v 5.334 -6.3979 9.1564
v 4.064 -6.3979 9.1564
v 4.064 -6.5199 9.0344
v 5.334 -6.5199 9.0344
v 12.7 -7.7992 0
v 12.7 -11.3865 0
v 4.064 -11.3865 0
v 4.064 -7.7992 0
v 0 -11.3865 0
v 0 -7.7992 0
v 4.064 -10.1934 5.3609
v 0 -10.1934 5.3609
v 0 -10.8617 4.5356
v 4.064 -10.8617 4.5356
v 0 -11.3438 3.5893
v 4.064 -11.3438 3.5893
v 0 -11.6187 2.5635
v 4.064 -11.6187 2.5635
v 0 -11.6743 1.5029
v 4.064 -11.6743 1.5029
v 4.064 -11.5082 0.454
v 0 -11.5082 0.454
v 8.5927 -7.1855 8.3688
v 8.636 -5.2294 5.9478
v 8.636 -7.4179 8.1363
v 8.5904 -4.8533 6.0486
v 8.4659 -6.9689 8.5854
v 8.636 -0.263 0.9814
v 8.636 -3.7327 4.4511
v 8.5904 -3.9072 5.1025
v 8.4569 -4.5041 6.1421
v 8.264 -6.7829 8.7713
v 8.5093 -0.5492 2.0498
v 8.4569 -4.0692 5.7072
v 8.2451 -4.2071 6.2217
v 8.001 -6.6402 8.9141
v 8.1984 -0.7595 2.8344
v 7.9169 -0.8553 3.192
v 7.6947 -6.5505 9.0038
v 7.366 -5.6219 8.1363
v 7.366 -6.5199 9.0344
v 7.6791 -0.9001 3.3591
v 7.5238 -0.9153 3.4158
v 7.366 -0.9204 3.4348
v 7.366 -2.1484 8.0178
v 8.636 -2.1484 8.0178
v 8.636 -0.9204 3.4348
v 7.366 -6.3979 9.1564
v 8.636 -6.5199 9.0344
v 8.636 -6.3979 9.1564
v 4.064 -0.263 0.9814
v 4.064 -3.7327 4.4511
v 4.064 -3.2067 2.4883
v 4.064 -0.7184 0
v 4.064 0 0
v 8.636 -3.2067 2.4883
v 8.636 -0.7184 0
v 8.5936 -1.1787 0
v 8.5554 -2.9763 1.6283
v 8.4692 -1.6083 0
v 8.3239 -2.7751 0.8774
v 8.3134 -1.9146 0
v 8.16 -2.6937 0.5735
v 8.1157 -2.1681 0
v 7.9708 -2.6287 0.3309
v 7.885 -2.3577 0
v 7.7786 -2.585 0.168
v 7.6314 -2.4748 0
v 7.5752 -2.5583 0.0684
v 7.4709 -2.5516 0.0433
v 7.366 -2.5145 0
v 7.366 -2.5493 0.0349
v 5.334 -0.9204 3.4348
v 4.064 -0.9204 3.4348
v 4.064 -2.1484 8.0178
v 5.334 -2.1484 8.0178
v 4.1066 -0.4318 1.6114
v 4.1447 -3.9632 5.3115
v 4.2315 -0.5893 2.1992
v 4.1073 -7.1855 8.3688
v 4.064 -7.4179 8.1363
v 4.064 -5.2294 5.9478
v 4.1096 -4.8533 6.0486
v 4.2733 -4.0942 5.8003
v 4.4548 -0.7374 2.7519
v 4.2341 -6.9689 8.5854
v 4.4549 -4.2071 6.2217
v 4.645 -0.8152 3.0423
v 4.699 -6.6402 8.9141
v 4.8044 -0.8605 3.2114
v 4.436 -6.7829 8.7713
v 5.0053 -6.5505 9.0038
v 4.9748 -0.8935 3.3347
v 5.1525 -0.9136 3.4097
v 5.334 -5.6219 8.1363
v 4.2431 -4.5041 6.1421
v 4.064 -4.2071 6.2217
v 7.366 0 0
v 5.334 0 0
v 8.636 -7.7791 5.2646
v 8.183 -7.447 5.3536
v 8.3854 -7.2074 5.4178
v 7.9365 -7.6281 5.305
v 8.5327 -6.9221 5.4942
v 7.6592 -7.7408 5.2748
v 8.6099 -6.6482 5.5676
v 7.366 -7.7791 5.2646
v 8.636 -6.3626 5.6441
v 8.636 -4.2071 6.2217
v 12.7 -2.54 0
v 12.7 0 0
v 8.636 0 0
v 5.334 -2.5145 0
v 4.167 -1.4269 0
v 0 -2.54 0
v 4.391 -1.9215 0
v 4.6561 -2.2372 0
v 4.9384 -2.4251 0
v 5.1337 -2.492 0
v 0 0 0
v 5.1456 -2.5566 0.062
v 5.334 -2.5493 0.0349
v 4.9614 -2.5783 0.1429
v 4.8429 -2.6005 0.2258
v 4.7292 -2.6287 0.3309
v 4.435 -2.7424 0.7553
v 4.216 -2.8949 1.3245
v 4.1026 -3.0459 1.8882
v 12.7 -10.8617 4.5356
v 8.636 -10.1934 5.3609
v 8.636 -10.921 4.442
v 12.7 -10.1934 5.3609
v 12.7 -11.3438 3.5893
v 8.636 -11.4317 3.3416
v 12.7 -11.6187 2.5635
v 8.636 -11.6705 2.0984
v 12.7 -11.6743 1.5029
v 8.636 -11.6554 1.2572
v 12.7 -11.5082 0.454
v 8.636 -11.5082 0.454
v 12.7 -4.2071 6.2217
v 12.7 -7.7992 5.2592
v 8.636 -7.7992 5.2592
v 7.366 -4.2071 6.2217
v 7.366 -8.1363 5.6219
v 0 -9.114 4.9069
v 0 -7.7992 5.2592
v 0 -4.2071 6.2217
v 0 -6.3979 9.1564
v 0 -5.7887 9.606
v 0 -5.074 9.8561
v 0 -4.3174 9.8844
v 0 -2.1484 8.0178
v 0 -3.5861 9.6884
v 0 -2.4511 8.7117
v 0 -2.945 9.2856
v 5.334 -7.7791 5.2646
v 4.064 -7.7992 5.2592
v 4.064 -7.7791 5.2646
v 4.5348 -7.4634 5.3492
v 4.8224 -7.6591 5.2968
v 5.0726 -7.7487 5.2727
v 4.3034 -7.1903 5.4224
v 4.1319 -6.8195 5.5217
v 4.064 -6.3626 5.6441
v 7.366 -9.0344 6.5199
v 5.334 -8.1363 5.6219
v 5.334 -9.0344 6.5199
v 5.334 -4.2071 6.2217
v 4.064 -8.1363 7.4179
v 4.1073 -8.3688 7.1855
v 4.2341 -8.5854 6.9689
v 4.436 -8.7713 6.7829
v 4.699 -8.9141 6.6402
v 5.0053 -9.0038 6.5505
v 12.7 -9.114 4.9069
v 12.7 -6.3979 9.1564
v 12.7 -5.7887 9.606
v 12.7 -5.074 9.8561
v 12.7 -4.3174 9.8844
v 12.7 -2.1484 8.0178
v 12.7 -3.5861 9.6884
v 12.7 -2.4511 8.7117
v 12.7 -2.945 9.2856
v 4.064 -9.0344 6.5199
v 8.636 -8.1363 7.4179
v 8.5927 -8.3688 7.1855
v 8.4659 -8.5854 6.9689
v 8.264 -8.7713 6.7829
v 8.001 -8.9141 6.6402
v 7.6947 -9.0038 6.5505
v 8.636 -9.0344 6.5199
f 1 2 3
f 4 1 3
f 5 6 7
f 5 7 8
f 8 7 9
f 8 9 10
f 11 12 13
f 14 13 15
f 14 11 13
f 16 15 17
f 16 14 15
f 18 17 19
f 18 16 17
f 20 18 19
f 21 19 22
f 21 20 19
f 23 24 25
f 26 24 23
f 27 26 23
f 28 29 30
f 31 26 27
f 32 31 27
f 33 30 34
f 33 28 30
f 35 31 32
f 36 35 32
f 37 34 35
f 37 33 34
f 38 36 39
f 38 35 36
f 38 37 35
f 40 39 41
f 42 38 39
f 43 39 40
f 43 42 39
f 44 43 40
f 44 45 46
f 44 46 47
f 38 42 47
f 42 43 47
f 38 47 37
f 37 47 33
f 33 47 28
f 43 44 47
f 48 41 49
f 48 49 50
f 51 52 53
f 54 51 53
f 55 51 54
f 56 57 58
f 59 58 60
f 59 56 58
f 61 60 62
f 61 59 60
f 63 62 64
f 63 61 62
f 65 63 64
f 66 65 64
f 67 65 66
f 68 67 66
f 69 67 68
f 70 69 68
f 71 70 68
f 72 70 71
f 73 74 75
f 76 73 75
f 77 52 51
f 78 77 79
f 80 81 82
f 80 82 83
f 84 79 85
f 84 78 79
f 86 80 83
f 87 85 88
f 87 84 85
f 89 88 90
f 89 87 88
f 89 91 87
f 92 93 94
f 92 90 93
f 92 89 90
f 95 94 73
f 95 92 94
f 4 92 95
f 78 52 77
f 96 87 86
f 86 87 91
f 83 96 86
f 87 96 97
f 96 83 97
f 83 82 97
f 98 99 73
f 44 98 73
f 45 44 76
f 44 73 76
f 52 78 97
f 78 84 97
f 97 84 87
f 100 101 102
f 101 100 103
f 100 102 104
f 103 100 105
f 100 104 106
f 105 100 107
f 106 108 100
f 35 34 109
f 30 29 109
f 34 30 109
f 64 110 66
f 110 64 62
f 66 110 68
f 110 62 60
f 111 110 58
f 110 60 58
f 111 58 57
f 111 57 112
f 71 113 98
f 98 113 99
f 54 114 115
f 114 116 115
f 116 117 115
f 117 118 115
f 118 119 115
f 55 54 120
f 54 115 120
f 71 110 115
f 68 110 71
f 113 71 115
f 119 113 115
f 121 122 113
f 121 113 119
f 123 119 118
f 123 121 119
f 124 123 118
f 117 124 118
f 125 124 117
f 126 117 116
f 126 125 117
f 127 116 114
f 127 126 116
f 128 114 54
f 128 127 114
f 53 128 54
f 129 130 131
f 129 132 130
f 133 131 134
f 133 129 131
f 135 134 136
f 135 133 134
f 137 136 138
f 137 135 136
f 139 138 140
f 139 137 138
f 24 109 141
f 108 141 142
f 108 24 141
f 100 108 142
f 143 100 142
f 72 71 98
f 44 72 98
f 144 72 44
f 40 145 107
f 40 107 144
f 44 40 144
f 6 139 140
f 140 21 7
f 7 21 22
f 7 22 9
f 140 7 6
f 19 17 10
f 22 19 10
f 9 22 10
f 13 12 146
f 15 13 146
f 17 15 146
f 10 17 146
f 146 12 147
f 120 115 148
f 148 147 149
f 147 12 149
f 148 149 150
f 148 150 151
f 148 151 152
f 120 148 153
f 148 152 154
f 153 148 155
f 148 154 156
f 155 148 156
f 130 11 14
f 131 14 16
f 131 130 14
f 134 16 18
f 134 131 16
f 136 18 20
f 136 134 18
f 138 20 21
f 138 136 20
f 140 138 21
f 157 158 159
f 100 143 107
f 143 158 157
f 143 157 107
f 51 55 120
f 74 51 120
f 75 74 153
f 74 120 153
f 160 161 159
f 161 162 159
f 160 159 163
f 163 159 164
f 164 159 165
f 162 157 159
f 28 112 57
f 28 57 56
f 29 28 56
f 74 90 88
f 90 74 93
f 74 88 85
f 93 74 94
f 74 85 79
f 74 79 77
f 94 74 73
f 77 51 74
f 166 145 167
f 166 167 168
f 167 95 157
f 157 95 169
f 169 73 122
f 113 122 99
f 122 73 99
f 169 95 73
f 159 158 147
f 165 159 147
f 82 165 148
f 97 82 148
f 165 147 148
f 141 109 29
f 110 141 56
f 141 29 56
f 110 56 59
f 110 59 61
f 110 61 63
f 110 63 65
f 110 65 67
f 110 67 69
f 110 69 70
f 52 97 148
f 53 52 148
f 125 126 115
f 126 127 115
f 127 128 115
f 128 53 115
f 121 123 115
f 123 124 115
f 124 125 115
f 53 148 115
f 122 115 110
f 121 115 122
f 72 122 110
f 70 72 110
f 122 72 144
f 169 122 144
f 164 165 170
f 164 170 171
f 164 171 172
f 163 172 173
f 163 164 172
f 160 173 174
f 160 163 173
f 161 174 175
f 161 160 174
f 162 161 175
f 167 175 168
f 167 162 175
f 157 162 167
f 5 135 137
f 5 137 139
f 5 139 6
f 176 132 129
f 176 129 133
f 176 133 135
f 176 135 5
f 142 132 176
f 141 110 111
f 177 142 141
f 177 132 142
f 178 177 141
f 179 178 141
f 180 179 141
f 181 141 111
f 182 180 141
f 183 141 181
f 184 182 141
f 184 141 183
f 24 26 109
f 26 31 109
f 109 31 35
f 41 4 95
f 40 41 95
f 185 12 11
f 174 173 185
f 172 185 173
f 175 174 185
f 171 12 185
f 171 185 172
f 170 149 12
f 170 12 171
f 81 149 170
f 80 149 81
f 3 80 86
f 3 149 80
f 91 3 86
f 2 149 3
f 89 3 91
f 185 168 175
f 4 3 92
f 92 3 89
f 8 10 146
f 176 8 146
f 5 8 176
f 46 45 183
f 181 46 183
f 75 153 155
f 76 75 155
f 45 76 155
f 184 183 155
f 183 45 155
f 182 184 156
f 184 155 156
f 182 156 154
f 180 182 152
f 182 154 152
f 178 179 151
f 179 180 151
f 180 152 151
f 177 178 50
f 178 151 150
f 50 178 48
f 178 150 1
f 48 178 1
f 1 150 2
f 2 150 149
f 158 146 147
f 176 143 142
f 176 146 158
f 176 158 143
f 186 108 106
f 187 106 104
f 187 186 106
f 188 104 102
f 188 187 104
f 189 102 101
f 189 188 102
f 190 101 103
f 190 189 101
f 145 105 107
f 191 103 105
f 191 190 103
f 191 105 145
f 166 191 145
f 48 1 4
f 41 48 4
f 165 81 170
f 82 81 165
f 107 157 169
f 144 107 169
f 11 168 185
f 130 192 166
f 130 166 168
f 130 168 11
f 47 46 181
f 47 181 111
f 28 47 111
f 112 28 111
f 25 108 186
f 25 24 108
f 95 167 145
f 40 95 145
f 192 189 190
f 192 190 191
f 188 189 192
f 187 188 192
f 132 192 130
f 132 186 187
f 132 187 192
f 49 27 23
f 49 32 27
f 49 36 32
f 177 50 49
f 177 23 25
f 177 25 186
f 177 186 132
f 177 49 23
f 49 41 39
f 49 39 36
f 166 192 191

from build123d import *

# Parameters (mm, degrees)
BOSS_EXTRUDE1_START   = -3.302
BOSS_EXTRUDE1_DEPTH   = 4.572
BOSS_EXTRUDE1_START_2 = -2.032
BOSS_EXTRUDE1_2_DEPTH = 3.302
BOSS_EXTRUDE1_START_3 = -10.998522628
BOSS_EXTRUDE1_3_DEPTH = 11.998522628
BOSS_EXTRUDE1_4_DEPTH = 3.444411758
SKETCH2_W             = 2.032
SKETCH2_H             = 1.27
CUT_EXTRUDE1_DEPTH    = 3.556
BOSS_EXTRUDE2_DEPTH   = 1.27
BOSS_EXTRUDE3_DEPTH   = 4.064
BOSS_EXTRUDE4_DEPTH   = 1.27
BOSS_EXTRUDE5_START   = 1.27
BOSS_EXTRUDE5_DEPTH   = 1.27
SKETCH7_W             = 8.636
SKETCH7_H             = 3.587305501
BOSS_EXTRUDE6_DEPTH   = 4.16775137
BOSS_EXTRUDE7_START   = 4.064
BOSS_EXTRUDE7_DEPTH   = 4.064
DRAFT1_DEPTH          = 12.7
DRAFT2_START          = -7.533451599
DRAFT2_OUTLINE_W      = 12.7
DRAFT2_OUTLINE_H      = 6.098582272
DRAFT2_DEPTH          = 5.08
FILLET1_R             = 1.27
FILLET2_R             = 5.08


with BuildPart() as part:
    # Boss-Extrude1: read off the stored shape, not the designer's step
    # Boss-Extrude1 outline → Boss-Extrude1 (new body)
    with BuildSketch(Plane(origin=(7.366, 0, 0), x_dir=(0, 0, -1), z_dir=(1, 0, 0)).offset(BOSS_EXTRUDE1_START)):
        with BuildLine():
            Line((-6.519894076, -9.03436579), (-5.264597758, -7.779069472))
            Line((-5.264597758, -7.779069472), (-6.221703947, -4.207100548))
            Line((-6.221703947, -4.207100548), (0, -2.54))
            Line((0, -2.54), (0, 0))
            Line((0, 0), (-8.017755171, -2.148351023))
            ThreePointArc((-8.017755171, -2.148351023), (-9.813806395, -3.944402247), (-9.156406021, -6.397853846))
            Line((-9.156406021, -6.397853846), (-6.519894076, -9.03436579))
        make_face()
    extrude(amount=BOSS_EXTRUDE1_DEPTH)

    # Boss-Extrude1 2 outline → Boss-Extrude1 2 (add)
    with BuildSketch(Plane(origin=(7.366, 0, 0), x_dir=(0, 0, -1), z_dir=(1, 0, 0)).offset(BOSS_EXTRUDE1_START_2)):
        Polygon((-4.16775137, -11.386508497), (-4.16775137, -7.799202996), (-5.259202996, -7.799202996), (-5.264597758, -7.779069472), (-6.519894076, -9.03436579), align=None)
    extrude(amount=BOSS_EXTRUDE1_2_DEPTH)

    # Boss-Extrude1 3 outline → Boss-Extrude1 3 (cut)
    with BuildSketch(Plane(origin=(0, 0, 0), x_dir=(1, 0, 0), z_dir=(0, 0.707106781186548, -0.707106781186547)).offset(BOSS_EXTRUDE1_START_3)):
        with BuildLine():
            Line((7.366, 1.778), (7.366, -6))
            Line((7.366, -6), (8.636000001, -6))
            Line((8.636000001, -6), (8.636000002, -4.490590949))
            Line((8.636000002, -4.490590949), (8.636, 0.508))
            ThreePointArc((8.636, 0.508), (8.264025612, 1.406025612), (7.366, 1.778))
        make_face()
        with BuildLine():
            Line((4.063999999, -6), (5.334, -6))
            Line((5.334, -6), (5.334, 1.778))
            ThreePointArc((5.334, 1.778), (4.435974388, 1.406025612), (4.064, 0.508))
            Line((4.064, 0.508), (4.064, -4.490590949))
            Line((4.064, -4.490590949), (4.063999999, -6))
        make_face()
    extrude(amount=BOSS_EXTRUDE1_3_DEPTH, mode=Mode.SUBTRACT)

    # Boss-Extrude1 4 outline → Boss-Extrude1 4 (cut)
    with BuildSketch(Plane(origin=(0, 0, 0), x_dir=(1, 0, 0), z_dir=(0, 0.707106781186548, -0.707106781186547)).offset(BOSS_EXTRUDE1_START_3)):
        with BuildLine():
            Line((8.636, 1.778), (7.366, 1.778))
            ThreePointArc((7.366, 1.778), (8.264025612, 1.406025612), (8.636, 0.508))
            Line((8.636, 0.508), (8.636, 1.778))
        make_face()
        with BuildLine():
            ThreePointArc((4.064, 0.508), (4.435974388, 1.406025612), (5.334, 1.778))
            Line((5.334, 1.778), (4.064, 1.778))
            Line((4.064, 1.778), (4.064, 0.508))
        make_face()
    extrude(amount=BOSS_EXTRUDE1_4_DEPTH, mode=Mode.SUBTRACT)

    # Sketch2 → Cut-Extrude1 (cut)
    with BuildSketch(Plane(origin=(0, -1.257235857, -1.257235857), x_dir=(1, 0, 0), z_dir=(0, -0.707106781186547, -0.707106781186548))):
        with Locations((6.35, 10.363522628)):
            Rectangle(SKETCH2_W, SKETCH2_H)
    extrude(amount=-CUT_EXTRUDE1_DEPTH, mode=Mode.SUBTRACT)

    # Sketch3 → Boss-Extrude2 (add)
    with BuildSketch(Plane(origin=(7.366, 0, 0), x_dir=(0, 0, -1), z_dir=(1, 0, 0))):
        with BuildLine():
            Line((-3.434832238, -0.920360524), (-9.03436579, -6.519894076))
            Line((-9.03436579, -6.519894076), (-9.156406021, -6.397853846))
            ThreePointArc((-9.156406021, -6.397853846), (-9.813806395, -3.944402247), (-8.017755171, -2.148351023))
            Line((-8.017755171, -2.148351023), (-3.434832238, -0.920360524))
        make_face()
    extrude(amount=BOSS_EXTRUDE2_DEPTH)

    # Sketch4 → Boss-Extrude3 (add)
    with BuildSketch(Plane(origin=(8.636, 0, 0), x_dir=(0, 0, -1), z_dir=(1, 0, 0))):
        with BuildLine():
            Line((-4.16775137, -11.386508497), (-9.156406021, -6.397853846))
            ThreePointArc((-9.156406021, -6.397853846), (-9.813806395, -3.944402247), (-8.017755171, -2.148351023))
            Line((-8.017755171, -2.148351023), (0, 0))
            Line((0, 0), (0, -2.54))
            Line((0, -2.54), (-6.221703947, -4.207100548))
            Line((-6.221703947, -4.207100548), (-5.259202996, -7.799202996))
            Line((-5.259202996, -7.799202996), (-4.16775137, -7.799202996))
            Line((-4.16775137, -7.799202996), (-4.16775137, -11.386508497))
        make_face()
    extrude(amount=BOSS_EXTRUDE3_DEPTH)

    # Sketch5 → Boss-Extrude4 (add)
    with BuildSketch(Plane.ZY.offset(-5.334)):
        Polygon((4.16775137, -11.386508497), (4.16775137, -7.799202996), (5.259202996, -7.799202996), (5.264597758, -7.779069472), (6.519894076, -9.03436579), align=None)
    extrude(amount=BOSS_EXTRUDE4_DEPTH)

    # Sketch6 → Boss-Extrude5 (add)
    with BuildSketch(Plane.ZY.offset(-5.334).offset(BOSS_EXTRUDE5_START)):
        with BuildLine():
            Line((9.156406021, -6.397853846), (9.03436579, -6.519894076))
            Line((9.03436579, -6.519894076), (3.434832238, -0.920360524))
            Line((3.434832238, -0.920360524), (8.017755171, -2.148351023))
            ThreePointArc((8.017755171, -2.148351023), (9.813806395, -3.944402247), (9.156406021, -6.397853846))
        make_face()
    extrude(amount=-BOSS_EXTRUDE5_DEPTH)

    # Sketch7 → Boss-Extrude6 (add)
    with BuildSketch(Plane(origin=(0, 0, 4.16775137), x_dir=(-1, 0, 0), z_dir=(0, 0, -1))):
        with Locations((-8.382, -9.592855747)):
            Rectangle(SKETCH7_W, SKETCH7_H)
    extrude(amount=BOSS_EXTRUDE6_DEPTH)

    # Sketch8 → Boss-Extrude7 (add)
    with BuildSketch(Plane.ZY.offset(-4.064).offset(BOSS_EXTRUDE7_START)):
        with BuildLine():
            Line((4.16775137, -11.386508497), (0, -11.386508497))
            Line((0, -11.386508497), (0, -7.799202996))
            Line((0, -7.799202996), (5.259202996, -7.799202996))
            Line((5.259202996, -7.799202996), (6.221703947, -4.207100548))
            Line((6.221703947, -4.207100548), (0, -2.54))
            Line((0, -2.54), (0, 0))
            Line((0, 0), (8.017755171, -2.148351023))
            ThreePointArc((8.017755171, -2.148351023), (9.813806395, -3.944402247), (9.156406021, -6.397853846))
            Line((9.156406021, -6.397853846), (4.16775137, -11.386508497))
        make_face()
    extrude(amount=-BOSS_EXTRUDE7_DEPTH)

    # Draft1: read off the stored shape, not the designer's step
    # Draft1 outline → Draft1 (add)
    with BuildSketch(Plane.YZ):
        Polygon((-11.386508497, 4.16775137), (-12.267257994, 3.287001873), (-11.386508497, 0), align=None)
    extrude(amount=DRAFT1_DEPTH)

    # Draft2: read off the stored shape, not the designer's step
    # Draft2 outline → Draft2 (cut)
    with BuildSketch(Plane(origin=(0, 0, 0), x_dir=(1, 0, 0), z_dir=(0, 0.9659258262890691, 0.2588190451025181)).offset(DRAFT2_START)):
        with Locations((6.35, -4.049291136)):
            Rectangle(DRAFT2_OUTLINE_W, DRAFT2_OUTLINE_H)
    extrude(amount=DRAFT2_DEPTH, mode=Mode.SUBTRACT)

    # Fillet1
    # the kernel refuses this fillet: 1.27 mm, written as the material it adds along each edge
    with BuildSketch(Plane(origin=(8.636, 1.324703506, 1.189768208), x_dir=(-1, 0, 0), z_dir=(0, -0.7071067811865481, 0.707106781186547))) as fillet1_piece_1_section:
        with BuildLine():
            CenterArc((FILLET1_R, FILLET1_R), FILLET1_R, 180, 90)
            Line((0, FILLET1_R), (0, 0))
            Line((0, 0), (FILLET1_R, 0))
        make_face()
    fillet1_piece_1 = extrude(amount=11.093936292, mode=Mode.PRIVATE)
    fillet1_piece_1 = split(fillet1_piece_1, bisect_by=Plane(origin=(8.636, -0.303841036, 7.267579181), z_dir=(0, 0.2588190451025224, -0.9659258262890679)), keep=Keep.TOP, mode=Mode.PRIVATE)
    fillet1_piece_1 = split(fillet1_piece_1, bisect_by=Plane(origin=(8.636, -0.208703743, 0.778892974), z_dir=(0, -0.9659258262890681, -0.2588190451025218)), keep=Keep.TOP, mode=Mode.PRIVATE)
    fillet1_piece_1 = split(fillet1_piece_1, bisect_by=Plane(origin=(8.636, -2.578556006, 0.143892974), z_dir=(0, 0.9659258262890685, 0.2588190451025197)), keep=Keep.TOP, mode=Mode.PRIVATE)
    add(fillet1_piece_1)
    with BuildSketch(Plane(origin=(8.636, 1.324703506, 1.189768208), x_dir=(-1, 0, 0), z_dir=(0, -0.7071067811865481, 0.707106781186547))) as fillet1_piece_2_section:
        with BuildLine():
            CenterArc((FILLET1_R, FILLET1_R), FILLET1_R, 180, 90)
            Line((0, FILLET1_R), (0, 0))
            Line((0, 0), (FILLET1_R, 0))
        make_face()
    fillet1_piece_2 = extrude(amount=11.093936292, mode=Mode.PRIVATE)
    fillet1_piece_2 = split(fillet1_piece_2, bisect_by=Plane(origin=(8.636, -0.303841036, 7.267579181), z_dir=(0, -0.2588190451025224, 0.9659258262890679)), keep=Keep.TOP, mode=Mode.PRIVATE)
    fillet1_piece_2 = split(fillet1_piece_2, bisect_by=Plane(origin=(8.636, -2.578556006, 0.143892974), z_dir=(0, 0.9659258262890685, 0.2588190451025197)), keep=Keep.TOP, mode=Mode.PRIVATE)
    add(fillet1_piece_2)
    with BuildSketch(Plane(origin=(8.636, 1.324703506, 1.189768208), x_dir=(-1, 0, 0), z_dir=(0, -0.7071067811865481, 0.707106781186547))) as fillet1_piece_3_section:
        with BuildLine():
            CenterArc((FILLET1_R, FILLET1_R), FILLET1_R, 180, 90)
            Line((0, FILLET1_R), (0, 0))
            Line((0, 0), (FILLET1_R, 0))
        make_face()
    fillet1_piece_3 = extrude(amount=11.093936292, mode=Mode.PRIVATE)
    fillet1_piece_3 = split(fillet1_piece_3, bisect_by=Plane(origin=(8.636, -0.303841036, 7.267579181), z_dir=(0, -0.2588190451025224, 0.9659258262890679)), keep=Keep.TOP, mode=Mode.PRIVATE)
    fillet1_piece_3 = split(fillet1_piece_3, bisect_by=Plane(origin=(8.636, -2.578556006, 0.143892974), z_dir=(0, -0.9659258262890685, -0.2588190451025197)), keep=Keep.TOP, mode=Mode.PRIVATE)
    add(fillet1_piece_3)
    with BuildSketch(Plane(origin=(4.064, -5.534005442, 3.019533728), x_dir=(1, 0, 0), z_dir=(0, -0.707106781186547, 0.707106781186548))) as fillet1_piece_4_section:
        with BuildLine():
            CenterArc((FILLET1_R, FILLET1_R), FILLET1_R, 180, 90)
            Line((0, FILLET1_R), (0, 0))
            Line((0, 0), (FILLET1_R, 0))
        make_face()
    fillet1_piece_4 = extrude(amount=4.950257078, mode=Mode.PRIVATE)
    fillet1_piece_4 = split(fillet1_piece_4, bisect_by=Plane(origin=(4.064, -6.245662223, 5.675472992), z_dir=(0, -0.2588190451025224, 0.9659258262890679)), keep=Keep.TOP, mode=Mode.PRIVATE)
    add(fillet1_piece_4)
    with BuildSketch(Plane(origin=(4.064, -6.519894076, 9.03436579), x_dir=(1, 0, 0), z_dir=(0, 0.7071067811865481, -0.707106781186547))) as fillet1_piece_5_section:
        with BuildLine():
            CenterArc((FILLET1_R, FILLET1_R), FILLET1_R, 180, 90)
            Line((0, FILLET1_R), (0, 0))
            Line((0, 0), (FILLET1_R, 0))
        make_face()
    fillet1_piece_5 = extrude(amount=11.093936292, mode=Mode.PRIVATE)
    fillet1_piece_5 = split(fillet1_piece_5, bisect_by=Plane(origin=(4.064, -5.065193799, 9.424151555), z_dir=(0, -0.965925826289068, -0.2588190451025222)), keep=Keep.TOP, mode=Mode.PRIVATE)
    fillet1_piece_5 = split(fillet1_piece_5, bisect_by=Plane(origin=(4.064, -5.661800826, 5.831918182), z_dir=(0, -0.2588190451025224, 0.9659258262890679)), keep=Keep.TOP, mode=Mode.PRIVATE)
    add(fillet1_piece_5)
    with BuildSketch(Plane(origin=(4.064, -6.519894076, 9.03436579), x_dir=(1, 0, 0), z_dir=(0, 0.7071067811865481, -0.707106781186547))) as fillet1_piece_6_section:
        with BuildLine():
            CenterArc((FILLET1_R, FILLET1_R), FILLET1_R, 180, 90)
            Line((0, FILLET1_R), (0, 0))
            Line((0, 0), (FILLET1_R, 0))
        make_face()
    fillet1_piece_6 = extrude(amount=11.093936292, mode=Mode.PRIVATE)
    fillet1_piece_6 = split(fillet1_piece_6, bisect_by=Plane(origin=(4.064, -5.065193799, 9.424151555), z_dir=(0, 0.965925826289068, 0.2588190451025222)), keep=Keep.TOP, mode=Mode.PRIVATE)
    fillet1_piece_6 = split(fillet1_piece_6, bisect_by=Plane(origin=(4.064, -5.661800826, 5.831918182), z_dir=(0, -0.2588190451025224, 0.9659258262890679)), keep=Keep.TOP, mode=Mode.PRIVATE)
    add(fillet1_piece_6)
    with BuildSketch(Plane(origin=(4.064, -6.519894076, 9.03436579), x_dir=(1, 0, 0), z_dir=(0, 0.7071067811865481, -0.707106781186547))) as fillet1_piece_7_section:
        with BuildLine():
            CenterArc((FILLET1_R, FILLET1_R), FILLET1_R, 180, 90)
            Line((0, FILLET1_R), (0, 0))
            Line((0, 0), (FILLET1_R, 0))
        make_face()
    fillet1_piece_7 = extrude(amount=11.093936292, mode=Mode.PRIVATE)
    fillet1_piece_7 = split(fillet1_piece_7, bisect_by=Plane(origin=(4.064, -5.065193799, 9.424151555), z_dir=(0, 0.965925826289068, 0.2588190451025222)), keep=Keep.TOP, mode=Mode.PRIVATE)
    fillet1_piece_7 = split(fillet1_piece_7, bisect_by=Plane(origin=(4.064, -5.661800826, 5.831918182), z_dir=(0, 0.2588190451025224, -0.9659258262890679)), keep=Keep.TOP, mode=Mode.PRIVATE)
    fillet1_piece_7 = split(fillet1_piece_7, bisect_by=Plane(origin=(4.064, -2.695341536, 10.059151555), z_dir=(0, -0.9659258262890681, -0.2588190451025218)), keep=Keep.TOP, mode=Mode.PRIVATE)
    add(fillet1_piece_7)
    with BuildSketch(Plane(origin=(8.636, -9.03436579, 6.519894076), x_dir=(-1, 0, 0), z_dir=(0, 0.707106781186548, -0.7071067811865471))) as fillet1_piece_8_section:
        with BuildLine():
            CenterArc((FILLET1_R, FILLET1_R), FILLET1_R, 180, 90)
            Line((0, FILLET1_R), (0, 0))
            Line((0, 0), (FILLET1_R, 0))
        make_face()
    fillet1_piece_8 = extrude(amount=4.950257078, mode=Mode.PRIVATE)
    fillet1_piece_8 = split(fillet1_piece_8, bisect_by=Plane(origin=(8.636, -8.636452802, 5.034862587), z_dir=(0, -0.2588190451025224, 0.9659258262890679)), keep=Keep.TOP, mode=Mode.PRIVATE)
    add(fillet1_piece_8)

    # Fillet2
    fillet2_edges = [part.edges().sort_by_distance(p)[0] for p in [
        (6.35, -12.267257994, 3.287001873),
    ]]
    fillet(fillet2_edges, radius=FILLET2_R)


solid = part.part
